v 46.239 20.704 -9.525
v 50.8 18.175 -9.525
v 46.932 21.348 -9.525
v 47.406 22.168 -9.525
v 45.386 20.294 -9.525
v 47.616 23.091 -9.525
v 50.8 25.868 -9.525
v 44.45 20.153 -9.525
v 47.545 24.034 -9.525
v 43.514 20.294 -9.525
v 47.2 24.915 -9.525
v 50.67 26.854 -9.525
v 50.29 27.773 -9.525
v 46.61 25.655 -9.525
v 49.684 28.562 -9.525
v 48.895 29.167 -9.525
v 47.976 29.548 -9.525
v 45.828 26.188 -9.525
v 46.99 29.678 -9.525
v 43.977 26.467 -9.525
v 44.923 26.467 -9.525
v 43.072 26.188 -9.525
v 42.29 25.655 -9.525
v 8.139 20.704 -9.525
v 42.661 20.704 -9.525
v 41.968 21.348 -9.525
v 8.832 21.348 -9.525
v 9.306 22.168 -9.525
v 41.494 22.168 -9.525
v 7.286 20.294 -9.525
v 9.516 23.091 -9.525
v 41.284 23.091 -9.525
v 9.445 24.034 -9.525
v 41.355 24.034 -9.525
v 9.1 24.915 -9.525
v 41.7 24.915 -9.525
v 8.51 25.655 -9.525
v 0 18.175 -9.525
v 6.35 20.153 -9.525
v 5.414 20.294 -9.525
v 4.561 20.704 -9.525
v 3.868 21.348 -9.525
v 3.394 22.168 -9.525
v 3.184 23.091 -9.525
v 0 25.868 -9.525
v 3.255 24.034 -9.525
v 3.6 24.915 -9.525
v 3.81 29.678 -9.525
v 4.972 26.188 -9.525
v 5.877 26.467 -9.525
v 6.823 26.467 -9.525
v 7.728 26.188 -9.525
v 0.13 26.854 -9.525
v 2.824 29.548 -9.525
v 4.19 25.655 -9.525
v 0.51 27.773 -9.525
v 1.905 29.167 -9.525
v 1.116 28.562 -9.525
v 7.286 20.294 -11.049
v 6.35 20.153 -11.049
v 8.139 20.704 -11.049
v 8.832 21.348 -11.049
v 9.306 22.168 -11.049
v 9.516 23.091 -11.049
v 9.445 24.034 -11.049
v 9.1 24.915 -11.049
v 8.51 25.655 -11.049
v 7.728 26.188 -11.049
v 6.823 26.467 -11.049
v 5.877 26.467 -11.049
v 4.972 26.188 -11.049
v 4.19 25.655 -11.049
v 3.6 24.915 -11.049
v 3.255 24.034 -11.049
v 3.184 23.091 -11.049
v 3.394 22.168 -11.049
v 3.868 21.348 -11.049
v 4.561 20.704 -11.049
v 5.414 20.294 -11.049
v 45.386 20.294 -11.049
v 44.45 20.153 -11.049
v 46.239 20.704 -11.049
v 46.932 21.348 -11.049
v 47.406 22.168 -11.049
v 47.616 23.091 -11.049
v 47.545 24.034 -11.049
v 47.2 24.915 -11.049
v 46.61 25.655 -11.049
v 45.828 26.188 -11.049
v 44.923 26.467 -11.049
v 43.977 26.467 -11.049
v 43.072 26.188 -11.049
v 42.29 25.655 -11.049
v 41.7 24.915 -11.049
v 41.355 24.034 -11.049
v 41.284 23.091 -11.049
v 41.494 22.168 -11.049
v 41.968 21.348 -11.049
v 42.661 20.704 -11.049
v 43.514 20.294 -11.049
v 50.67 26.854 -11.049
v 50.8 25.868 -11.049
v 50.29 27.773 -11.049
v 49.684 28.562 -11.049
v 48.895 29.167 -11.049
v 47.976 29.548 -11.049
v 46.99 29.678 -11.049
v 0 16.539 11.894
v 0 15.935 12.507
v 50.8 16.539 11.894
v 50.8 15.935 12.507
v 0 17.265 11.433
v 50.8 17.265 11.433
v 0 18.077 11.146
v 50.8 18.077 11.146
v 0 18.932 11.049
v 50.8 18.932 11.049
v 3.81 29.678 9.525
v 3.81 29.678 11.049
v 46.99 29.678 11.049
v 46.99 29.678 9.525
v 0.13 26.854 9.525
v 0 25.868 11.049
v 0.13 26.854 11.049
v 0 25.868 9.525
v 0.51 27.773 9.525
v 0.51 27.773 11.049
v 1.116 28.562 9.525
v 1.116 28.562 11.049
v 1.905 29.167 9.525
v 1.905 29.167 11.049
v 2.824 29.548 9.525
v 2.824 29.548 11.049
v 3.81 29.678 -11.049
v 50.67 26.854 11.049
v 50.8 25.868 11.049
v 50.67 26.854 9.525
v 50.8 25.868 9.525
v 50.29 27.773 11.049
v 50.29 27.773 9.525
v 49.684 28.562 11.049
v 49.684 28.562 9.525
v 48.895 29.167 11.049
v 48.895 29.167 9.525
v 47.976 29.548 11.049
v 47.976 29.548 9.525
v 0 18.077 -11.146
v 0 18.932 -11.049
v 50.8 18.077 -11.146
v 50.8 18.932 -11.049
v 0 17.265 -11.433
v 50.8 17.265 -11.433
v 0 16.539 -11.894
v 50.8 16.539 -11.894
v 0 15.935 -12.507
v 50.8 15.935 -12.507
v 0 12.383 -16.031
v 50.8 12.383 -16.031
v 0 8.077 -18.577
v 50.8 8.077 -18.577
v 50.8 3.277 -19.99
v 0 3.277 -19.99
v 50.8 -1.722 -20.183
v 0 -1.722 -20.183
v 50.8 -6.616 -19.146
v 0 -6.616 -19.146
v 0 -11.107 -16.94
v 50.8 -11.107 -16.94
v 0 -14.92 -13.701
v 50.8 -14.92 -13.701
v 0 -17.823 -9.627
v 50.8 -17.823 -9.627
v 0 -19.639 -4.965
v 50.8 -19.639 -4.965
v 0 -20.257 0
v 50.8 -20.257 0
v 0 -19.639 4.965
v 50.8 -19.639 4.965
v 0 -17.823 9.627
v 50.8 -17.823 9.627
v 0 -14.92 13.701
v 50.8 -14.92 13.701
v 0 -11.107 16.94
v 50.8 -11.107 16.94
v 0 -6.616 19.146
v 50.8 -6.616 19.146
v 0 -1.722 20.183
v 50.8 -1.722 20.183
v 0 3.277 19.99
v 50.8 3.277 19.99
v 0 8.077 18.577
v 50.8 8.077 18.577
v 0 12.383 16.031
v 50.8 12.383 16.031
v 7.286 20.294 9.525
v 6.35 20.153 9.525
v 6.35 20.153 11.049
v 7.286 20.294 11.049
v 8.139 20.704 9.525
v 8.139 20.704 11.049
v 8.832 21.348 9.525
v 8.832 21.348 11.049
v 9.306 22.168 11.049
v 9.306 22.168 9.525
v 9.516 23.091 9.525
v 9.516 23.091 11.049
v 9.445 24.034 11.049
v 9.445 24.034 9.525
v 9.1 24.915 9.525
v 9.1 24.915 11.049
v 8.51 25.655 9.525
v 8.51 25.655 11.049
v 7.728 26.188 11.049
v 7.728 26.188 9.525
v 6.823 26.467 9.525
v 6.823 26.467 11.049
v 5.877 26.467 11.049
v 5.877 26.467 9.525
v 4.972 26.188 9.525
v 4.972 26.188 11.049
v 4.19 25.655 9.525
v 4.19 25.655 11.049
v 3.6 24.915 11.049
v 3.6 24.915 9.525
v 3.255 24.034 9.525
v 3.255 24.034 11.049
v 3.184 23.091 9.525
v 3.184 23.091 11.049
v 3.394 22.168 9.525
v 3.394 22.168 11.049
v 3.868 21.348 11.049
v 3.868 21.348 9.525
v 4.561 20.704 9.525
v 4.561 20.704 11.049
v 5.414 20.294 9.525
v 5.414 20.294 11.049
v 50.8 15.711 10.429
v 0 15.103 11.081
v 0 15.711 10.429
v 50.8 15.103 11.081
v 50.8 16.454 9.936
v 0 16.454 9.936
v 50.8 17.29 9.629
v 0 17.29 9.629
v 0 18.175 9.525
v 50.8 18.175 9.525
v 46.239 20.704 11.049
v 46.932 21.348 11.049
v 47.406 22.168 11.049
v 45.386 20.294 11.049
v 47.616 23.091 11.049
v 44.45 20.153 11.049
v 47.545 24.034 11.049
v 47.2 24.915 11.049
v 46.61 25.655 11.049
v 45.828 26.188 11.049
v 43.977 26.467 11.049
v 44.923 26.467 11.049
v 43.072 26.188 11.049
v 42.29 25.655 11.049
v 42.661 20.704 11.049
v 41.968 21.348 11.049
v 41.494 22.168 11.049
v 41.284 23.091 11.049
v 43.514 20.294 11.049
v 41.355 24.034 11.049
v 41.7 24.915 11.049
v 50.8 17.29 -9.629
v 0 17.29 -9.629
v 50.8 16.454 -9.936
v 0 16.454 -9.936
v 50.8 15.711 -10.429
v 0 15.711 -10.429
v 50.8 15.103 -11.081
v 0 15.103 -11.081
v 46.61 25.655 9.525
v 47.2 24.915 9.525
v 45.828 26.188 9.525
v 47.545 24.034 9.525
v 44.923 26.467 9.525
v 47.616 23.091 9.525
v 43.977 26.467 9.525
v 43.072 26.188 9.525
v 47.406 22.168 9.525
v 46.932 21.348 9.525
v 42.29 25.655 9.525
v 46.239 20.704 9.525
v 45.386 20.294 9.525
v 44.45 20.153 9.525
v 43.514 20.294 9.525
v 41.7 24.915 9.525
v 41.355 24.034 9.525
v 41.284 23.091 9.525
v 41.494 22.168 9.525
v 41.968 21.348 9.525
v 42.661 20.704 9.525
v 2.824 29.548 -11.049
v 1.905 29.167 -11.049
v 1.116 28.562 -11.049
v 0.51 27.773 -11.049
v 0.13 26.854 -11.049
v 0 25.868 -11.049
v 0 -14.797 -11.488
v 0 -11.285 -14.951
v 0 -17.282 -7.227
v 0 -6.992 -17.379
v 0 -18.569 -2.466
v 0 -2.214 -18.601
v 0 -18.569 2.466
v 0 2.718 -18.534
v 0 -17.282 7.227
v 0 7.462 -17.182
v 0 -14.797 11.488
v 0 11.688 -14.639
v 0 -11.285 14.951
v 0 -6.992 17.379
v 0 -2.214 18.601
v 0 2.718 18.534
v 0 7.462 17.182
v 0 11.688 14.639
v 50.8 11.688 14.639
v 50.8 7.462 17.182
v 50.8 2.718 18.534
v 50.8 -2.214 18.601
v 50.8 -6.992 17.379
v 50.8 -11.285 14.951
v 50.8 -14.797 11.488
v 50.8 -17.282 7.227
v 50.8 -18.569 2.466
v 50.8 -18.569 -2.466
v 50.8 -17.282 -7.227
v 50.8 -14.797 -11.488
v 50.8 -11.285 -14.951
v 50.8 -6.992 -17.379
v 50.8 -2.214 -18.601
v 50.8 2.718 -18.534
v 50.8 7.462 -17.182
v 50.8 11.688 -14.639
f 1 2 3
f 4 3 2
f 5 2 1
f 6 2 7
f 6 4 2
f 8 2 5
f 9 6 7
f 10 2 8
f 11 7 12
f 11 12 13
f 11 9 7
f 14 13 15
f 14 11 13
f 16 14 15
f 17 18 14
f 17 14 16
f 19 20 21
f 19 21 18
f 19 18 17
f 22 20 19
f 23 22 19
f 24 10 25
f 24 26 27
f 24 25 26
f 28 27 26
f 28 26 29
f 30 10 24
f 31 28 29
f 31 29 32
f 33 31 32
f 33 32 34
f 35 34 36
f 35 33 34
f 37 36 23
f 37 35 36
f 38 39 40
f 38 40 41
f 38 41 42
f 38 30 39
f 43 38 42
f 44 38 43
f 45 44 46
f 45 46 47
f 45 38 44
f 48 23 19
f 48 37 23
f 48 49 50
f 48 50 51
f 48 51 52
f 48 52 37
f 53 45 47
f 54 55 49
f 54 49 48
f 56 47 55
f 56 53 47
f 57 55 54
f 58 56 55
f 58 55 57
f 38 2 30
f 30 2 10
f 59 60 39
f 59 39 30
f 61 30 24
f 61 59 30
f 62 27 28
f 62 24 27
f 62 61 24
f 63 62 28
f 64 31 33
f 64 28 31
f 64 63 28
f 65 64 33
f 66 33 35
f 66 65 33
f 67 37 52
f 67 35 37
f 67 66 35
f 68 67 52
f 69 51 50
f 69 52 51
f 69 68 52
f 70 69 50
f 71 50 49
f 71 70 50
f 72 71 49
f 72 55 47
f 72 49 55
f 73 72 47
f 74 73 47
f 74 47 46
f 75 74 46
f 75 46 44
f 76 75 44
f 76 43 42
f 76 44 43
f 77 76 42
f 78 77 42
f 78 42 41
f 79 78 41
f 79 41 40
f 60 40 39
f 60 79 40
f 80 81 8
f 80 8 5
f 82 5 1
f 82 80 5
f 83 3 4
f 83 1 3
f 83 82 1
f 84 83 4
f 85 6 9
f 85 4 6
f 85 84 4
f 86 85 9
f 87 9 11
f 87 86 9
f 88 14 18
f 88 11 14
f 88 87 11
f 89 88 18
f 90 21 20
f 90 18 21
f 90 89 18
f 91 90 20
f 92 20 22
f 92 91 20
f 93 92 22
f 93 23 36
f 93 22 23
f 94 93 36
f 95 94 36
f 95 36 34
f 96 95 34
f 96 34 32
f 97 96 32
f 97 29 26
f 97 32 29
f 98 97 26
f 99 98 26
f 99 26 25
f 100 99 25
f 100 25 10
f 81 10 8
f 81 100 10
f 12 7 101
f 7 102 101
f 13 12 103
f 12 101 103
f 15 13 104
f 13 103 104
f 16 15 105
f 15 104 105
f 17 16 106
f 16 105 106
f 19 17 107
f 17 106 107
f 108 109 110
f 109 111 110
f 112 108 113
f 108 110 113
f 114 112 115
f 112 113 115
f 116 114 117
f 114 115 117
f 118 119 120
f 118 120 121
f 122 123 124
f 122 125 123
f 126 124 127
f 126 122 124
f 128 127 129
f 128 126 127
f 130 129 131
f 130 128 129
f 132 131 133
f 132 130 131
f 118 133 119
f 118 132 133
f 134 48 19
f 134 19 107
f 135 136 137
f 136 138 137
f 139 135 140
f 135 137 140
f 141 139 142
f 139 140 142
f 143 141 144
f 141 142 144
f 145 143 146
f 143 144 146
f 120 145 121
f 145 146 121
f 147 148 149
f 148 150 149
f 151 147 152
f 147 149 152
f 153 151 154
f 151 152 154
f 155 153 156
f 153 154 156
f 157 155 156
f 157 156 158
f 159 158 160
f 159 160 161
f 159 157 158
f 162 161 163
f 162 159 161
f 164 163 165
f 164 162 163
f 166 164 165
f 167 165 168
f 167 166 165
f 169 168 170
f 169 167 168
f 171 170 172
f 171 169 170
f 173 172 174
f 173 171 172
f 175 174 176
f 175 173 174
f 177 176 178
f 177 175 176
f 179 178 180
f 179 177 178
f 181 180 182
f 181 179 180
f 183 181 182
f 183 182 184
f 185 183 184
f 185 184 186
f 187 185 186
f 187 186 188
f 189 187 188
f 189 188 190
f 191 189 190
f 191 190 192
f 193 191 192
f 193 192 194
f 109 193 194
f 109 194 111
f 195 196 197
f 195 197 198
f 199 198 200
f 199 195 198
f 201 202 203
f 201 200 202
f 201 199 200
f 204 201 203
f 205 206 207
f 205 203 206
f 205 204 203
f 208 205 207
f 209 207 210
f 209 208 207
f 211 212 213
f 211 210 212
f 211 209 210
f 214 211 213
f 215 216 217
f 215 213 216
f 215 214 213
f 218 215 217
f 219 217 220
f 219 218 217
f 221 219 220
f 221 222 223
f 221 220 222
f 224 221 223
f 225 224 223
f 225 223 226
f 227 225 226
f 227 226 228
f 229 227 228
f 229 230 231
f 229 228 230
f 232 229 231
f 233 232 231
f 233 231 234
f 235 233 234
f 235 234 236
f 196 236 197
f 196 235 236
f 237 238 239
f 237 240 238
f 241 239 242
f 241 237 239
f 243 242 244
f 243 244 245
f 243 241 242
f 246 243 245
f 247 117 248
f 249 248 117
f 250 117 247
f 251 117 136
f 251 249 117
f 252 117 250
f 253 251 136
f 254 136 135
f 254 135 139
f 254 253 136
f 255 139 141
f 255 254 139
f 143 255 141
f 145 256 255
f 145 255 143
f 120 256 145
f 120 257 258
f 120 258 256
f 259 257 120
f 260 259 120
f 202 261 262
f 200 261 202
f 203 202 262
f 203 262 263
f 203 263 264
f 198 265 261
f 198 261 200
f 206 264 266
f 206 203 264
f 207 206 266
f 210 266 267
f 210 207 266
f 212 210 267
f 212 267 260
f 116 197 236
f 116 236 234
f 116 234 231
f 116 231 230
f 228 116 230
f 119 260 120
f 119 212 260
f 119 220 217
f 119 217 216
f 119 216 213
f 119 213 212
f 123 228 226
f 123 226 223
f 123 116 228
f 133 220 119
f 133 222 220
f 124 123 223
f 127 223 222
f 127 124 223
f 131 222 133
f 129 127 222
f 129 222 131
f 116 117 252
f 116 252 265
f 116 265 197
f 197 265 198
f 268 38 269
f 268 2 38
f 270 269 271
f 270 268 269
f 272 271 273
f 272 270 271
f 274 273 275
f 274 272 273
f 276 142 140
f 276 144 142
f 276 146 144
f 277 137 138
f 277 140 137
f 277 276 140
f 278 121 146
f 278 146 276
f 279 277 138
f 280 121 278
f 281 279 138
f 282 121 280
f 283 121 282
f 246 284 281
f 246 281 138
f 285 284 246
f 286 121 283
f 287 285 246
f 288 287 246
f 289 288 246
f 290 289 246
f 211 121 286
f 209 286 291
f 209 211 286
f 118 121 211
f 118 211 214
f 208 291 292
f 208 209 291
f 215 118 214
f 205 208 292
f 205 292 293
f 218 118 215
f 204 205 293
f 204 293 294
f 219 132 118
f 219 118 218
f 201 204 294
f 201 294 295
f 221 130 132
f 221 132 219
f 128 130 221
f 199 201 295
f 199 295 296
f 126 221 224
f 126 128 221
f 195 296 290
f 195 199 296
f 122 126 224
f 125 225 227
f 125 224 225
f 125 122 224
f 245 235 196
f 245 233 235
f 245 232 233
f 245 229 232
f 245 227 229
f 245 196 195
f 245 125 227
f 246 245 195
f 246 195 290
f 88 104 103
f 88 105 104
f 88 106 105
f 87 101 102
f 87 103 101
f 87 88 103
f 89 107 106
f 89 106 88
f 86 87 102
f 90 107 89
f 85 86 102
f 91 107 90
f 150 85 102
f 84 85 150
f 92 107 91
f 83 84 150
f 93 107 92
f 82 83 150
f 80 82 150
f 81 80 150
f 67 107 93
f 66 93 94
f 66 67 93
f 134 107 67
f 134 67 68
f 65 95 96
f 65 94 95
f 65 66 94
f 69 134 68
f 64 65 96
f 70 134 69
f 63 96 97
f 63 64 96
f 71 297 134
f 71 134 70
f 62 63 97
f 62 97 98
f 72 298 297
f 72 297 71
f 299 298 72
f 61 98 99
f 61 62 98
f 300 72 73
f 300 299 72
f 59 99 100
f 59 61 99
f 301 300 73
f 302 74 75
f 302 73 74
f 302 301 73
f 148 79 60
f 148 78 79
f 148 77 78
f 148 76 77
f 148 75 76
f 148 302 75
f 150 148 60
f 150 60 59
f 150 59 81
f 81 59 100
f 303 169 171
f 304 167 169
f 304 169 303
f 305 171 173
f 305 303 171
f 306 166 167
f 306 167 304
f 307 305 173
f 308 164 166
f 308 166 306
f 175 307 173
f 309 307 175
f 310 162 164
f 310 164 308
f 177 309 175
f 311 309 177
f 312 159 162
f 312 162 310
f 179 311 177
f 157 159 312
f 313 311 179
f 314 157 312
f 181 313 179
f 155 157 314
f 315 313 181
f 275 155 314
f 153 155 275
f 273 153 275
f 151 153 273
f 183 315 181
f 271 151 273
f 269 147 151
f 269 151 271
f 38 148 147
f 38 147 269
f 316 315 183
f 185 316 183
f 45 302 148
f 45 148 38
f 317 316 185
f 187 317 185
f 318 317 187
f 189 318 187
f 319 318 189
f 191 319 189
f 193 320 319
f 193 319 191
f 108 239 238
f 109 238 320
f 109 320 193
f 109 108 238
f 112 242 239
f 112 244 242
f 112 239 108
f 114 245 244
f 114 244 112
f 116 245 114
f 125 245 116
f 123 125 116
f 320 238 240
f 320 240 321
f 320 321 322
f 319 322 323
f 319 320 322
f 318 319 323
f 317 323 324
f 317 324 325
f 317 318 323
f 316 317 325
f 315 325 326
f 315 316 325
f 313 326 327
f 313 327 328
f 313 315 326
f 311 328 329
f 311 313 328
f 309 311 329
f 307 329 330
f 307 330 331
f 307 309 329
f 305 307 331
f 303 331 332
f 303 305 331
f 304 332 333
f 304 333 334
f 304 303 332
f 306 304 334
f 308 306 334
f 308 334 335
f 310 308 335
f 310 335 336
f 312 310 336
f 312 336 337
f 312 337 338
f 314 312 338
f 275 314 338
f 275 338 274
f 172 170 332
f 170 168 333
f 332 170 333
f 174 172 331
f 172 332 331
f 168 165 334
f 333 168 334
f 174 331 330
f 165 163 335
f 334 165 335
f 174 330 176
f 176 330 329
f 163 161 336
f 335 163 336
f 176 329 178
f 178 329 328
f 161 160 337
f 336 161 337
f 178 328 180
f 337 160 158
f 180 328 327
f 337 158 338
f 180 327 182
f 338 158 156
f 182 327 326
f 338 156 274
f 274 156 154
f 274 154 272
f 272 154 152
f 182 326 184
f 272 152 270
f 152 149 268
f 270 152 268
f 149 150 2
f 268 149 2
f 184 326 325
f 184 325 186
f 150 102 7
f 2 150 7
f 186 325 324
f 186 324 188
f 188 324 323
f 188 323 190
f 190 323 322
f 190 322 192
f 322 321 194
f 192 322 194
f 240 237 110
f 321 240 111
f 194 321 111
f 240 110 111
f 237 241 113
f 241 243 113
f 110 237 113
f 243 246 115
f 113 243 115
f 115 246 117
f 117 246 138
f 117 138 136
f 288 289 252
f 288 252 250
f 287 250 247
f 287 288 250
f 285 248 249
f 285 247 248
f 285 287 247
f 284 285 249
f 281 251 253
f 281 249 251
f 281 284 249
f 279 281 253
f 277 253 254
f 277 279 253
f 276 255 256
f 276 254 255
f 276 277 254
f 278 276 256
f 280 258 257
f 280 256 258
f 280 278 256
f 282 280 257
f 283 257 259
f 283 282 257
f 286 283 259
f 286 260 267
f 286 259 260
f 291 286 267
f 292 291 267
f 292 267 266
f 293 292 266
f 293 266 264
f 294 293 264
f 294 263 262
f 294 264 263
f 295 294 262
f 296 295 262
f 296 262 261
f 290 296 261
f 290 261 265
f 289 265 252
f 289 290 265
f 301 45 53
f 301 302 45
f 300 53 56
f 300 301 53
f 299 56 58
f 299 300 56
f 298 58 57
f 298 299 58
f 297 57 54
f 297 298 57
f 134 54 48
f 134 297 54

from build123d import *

# Parameters (mm, degrees)
BOSS_EXTRUDE1_DEPTH     = 50.8
CUT_EXTRUDE1_DEPTH      = 63.223284049
CUT_EXTRUDE1_DEPTH_BACK = 63.223284049
SKETCH2_R               = 3.175
FILLET1_R               = 3.81


with BuildPart() as part:
    # Sketch1 → Boss-Extrude1 (new body)
    with BuildSketch(Plane(origin=(0, 0, 0), x_dir=(0, 0, -1), z_dir=(1, 0, 0))):
        with BuildLine():
            Line((9.525, 16.130124961), (9.525, 29.677791118))
            Line((9.525, 29.677791118), (11.049, 29.677791118))
            Line((11.049, 29.677791118), (11.049, 16.977791118))
            ThreePointArc((11.049, 16.977791118), (0, -20.2565), (-11.049, 16.977791118))
            Line((-11.049, 16.977791118), (-11.049, 29.677791118))
            Line((-11.049, 29.677791118), (-9.525, 29.677791118))
            Line((-9.525, 29.677791118), (-9.525, 16.130124961))
            ThreePointArc((-9.525, 16.130124961), (0, -18.7325), (9.525, 16.130124961))
        make_face()
    extrude(amount=BOSS_EXTRUDE1_DEPTH)

    # Sketch2 → Cut-Extrude1 (cut, two sides: drawn at the far end of the back side and taken through both)
    with BuildSketch(Plane.XY.offset(-CUT_EXTRUDE1_DEPTH_BACK)):
        with Locations(Location((6.35, 23.327791118, 0), (0, 0, 270))):
            Circle(SKETCH2_R)
        with Locations(Location((44.45, 23.327791118, 0), (0, 0, 270))):
            Circle(SKETCH2_R)
    extrude(amount=CUT_EXTRUDE1_DEPTH + CUT_EXTRUDE1_DEPTH_BACK, mode=Mode.SUBTRACT)

    # Fillet1
    fillet1_edges = [part.edges().sort_by_distance(p)[0] for p in [
        (0, 29.677791118, 10.287),
        (50.8, 29.677791118, 10.287),
        (25.4, 16.130124961, -9.525),
        (25.4, 16.977791118, -11.049),
        (25.4, 16.977791118, 11.049),
        (25.4, 16.130124961, 9.525),
        (50.8, 29.677791118, -10.287),
        (0, 29.677791118, -10.287),
    ]]
    fillet(fillet1_edges, radius=FILLET1_R)


solid = part.part
